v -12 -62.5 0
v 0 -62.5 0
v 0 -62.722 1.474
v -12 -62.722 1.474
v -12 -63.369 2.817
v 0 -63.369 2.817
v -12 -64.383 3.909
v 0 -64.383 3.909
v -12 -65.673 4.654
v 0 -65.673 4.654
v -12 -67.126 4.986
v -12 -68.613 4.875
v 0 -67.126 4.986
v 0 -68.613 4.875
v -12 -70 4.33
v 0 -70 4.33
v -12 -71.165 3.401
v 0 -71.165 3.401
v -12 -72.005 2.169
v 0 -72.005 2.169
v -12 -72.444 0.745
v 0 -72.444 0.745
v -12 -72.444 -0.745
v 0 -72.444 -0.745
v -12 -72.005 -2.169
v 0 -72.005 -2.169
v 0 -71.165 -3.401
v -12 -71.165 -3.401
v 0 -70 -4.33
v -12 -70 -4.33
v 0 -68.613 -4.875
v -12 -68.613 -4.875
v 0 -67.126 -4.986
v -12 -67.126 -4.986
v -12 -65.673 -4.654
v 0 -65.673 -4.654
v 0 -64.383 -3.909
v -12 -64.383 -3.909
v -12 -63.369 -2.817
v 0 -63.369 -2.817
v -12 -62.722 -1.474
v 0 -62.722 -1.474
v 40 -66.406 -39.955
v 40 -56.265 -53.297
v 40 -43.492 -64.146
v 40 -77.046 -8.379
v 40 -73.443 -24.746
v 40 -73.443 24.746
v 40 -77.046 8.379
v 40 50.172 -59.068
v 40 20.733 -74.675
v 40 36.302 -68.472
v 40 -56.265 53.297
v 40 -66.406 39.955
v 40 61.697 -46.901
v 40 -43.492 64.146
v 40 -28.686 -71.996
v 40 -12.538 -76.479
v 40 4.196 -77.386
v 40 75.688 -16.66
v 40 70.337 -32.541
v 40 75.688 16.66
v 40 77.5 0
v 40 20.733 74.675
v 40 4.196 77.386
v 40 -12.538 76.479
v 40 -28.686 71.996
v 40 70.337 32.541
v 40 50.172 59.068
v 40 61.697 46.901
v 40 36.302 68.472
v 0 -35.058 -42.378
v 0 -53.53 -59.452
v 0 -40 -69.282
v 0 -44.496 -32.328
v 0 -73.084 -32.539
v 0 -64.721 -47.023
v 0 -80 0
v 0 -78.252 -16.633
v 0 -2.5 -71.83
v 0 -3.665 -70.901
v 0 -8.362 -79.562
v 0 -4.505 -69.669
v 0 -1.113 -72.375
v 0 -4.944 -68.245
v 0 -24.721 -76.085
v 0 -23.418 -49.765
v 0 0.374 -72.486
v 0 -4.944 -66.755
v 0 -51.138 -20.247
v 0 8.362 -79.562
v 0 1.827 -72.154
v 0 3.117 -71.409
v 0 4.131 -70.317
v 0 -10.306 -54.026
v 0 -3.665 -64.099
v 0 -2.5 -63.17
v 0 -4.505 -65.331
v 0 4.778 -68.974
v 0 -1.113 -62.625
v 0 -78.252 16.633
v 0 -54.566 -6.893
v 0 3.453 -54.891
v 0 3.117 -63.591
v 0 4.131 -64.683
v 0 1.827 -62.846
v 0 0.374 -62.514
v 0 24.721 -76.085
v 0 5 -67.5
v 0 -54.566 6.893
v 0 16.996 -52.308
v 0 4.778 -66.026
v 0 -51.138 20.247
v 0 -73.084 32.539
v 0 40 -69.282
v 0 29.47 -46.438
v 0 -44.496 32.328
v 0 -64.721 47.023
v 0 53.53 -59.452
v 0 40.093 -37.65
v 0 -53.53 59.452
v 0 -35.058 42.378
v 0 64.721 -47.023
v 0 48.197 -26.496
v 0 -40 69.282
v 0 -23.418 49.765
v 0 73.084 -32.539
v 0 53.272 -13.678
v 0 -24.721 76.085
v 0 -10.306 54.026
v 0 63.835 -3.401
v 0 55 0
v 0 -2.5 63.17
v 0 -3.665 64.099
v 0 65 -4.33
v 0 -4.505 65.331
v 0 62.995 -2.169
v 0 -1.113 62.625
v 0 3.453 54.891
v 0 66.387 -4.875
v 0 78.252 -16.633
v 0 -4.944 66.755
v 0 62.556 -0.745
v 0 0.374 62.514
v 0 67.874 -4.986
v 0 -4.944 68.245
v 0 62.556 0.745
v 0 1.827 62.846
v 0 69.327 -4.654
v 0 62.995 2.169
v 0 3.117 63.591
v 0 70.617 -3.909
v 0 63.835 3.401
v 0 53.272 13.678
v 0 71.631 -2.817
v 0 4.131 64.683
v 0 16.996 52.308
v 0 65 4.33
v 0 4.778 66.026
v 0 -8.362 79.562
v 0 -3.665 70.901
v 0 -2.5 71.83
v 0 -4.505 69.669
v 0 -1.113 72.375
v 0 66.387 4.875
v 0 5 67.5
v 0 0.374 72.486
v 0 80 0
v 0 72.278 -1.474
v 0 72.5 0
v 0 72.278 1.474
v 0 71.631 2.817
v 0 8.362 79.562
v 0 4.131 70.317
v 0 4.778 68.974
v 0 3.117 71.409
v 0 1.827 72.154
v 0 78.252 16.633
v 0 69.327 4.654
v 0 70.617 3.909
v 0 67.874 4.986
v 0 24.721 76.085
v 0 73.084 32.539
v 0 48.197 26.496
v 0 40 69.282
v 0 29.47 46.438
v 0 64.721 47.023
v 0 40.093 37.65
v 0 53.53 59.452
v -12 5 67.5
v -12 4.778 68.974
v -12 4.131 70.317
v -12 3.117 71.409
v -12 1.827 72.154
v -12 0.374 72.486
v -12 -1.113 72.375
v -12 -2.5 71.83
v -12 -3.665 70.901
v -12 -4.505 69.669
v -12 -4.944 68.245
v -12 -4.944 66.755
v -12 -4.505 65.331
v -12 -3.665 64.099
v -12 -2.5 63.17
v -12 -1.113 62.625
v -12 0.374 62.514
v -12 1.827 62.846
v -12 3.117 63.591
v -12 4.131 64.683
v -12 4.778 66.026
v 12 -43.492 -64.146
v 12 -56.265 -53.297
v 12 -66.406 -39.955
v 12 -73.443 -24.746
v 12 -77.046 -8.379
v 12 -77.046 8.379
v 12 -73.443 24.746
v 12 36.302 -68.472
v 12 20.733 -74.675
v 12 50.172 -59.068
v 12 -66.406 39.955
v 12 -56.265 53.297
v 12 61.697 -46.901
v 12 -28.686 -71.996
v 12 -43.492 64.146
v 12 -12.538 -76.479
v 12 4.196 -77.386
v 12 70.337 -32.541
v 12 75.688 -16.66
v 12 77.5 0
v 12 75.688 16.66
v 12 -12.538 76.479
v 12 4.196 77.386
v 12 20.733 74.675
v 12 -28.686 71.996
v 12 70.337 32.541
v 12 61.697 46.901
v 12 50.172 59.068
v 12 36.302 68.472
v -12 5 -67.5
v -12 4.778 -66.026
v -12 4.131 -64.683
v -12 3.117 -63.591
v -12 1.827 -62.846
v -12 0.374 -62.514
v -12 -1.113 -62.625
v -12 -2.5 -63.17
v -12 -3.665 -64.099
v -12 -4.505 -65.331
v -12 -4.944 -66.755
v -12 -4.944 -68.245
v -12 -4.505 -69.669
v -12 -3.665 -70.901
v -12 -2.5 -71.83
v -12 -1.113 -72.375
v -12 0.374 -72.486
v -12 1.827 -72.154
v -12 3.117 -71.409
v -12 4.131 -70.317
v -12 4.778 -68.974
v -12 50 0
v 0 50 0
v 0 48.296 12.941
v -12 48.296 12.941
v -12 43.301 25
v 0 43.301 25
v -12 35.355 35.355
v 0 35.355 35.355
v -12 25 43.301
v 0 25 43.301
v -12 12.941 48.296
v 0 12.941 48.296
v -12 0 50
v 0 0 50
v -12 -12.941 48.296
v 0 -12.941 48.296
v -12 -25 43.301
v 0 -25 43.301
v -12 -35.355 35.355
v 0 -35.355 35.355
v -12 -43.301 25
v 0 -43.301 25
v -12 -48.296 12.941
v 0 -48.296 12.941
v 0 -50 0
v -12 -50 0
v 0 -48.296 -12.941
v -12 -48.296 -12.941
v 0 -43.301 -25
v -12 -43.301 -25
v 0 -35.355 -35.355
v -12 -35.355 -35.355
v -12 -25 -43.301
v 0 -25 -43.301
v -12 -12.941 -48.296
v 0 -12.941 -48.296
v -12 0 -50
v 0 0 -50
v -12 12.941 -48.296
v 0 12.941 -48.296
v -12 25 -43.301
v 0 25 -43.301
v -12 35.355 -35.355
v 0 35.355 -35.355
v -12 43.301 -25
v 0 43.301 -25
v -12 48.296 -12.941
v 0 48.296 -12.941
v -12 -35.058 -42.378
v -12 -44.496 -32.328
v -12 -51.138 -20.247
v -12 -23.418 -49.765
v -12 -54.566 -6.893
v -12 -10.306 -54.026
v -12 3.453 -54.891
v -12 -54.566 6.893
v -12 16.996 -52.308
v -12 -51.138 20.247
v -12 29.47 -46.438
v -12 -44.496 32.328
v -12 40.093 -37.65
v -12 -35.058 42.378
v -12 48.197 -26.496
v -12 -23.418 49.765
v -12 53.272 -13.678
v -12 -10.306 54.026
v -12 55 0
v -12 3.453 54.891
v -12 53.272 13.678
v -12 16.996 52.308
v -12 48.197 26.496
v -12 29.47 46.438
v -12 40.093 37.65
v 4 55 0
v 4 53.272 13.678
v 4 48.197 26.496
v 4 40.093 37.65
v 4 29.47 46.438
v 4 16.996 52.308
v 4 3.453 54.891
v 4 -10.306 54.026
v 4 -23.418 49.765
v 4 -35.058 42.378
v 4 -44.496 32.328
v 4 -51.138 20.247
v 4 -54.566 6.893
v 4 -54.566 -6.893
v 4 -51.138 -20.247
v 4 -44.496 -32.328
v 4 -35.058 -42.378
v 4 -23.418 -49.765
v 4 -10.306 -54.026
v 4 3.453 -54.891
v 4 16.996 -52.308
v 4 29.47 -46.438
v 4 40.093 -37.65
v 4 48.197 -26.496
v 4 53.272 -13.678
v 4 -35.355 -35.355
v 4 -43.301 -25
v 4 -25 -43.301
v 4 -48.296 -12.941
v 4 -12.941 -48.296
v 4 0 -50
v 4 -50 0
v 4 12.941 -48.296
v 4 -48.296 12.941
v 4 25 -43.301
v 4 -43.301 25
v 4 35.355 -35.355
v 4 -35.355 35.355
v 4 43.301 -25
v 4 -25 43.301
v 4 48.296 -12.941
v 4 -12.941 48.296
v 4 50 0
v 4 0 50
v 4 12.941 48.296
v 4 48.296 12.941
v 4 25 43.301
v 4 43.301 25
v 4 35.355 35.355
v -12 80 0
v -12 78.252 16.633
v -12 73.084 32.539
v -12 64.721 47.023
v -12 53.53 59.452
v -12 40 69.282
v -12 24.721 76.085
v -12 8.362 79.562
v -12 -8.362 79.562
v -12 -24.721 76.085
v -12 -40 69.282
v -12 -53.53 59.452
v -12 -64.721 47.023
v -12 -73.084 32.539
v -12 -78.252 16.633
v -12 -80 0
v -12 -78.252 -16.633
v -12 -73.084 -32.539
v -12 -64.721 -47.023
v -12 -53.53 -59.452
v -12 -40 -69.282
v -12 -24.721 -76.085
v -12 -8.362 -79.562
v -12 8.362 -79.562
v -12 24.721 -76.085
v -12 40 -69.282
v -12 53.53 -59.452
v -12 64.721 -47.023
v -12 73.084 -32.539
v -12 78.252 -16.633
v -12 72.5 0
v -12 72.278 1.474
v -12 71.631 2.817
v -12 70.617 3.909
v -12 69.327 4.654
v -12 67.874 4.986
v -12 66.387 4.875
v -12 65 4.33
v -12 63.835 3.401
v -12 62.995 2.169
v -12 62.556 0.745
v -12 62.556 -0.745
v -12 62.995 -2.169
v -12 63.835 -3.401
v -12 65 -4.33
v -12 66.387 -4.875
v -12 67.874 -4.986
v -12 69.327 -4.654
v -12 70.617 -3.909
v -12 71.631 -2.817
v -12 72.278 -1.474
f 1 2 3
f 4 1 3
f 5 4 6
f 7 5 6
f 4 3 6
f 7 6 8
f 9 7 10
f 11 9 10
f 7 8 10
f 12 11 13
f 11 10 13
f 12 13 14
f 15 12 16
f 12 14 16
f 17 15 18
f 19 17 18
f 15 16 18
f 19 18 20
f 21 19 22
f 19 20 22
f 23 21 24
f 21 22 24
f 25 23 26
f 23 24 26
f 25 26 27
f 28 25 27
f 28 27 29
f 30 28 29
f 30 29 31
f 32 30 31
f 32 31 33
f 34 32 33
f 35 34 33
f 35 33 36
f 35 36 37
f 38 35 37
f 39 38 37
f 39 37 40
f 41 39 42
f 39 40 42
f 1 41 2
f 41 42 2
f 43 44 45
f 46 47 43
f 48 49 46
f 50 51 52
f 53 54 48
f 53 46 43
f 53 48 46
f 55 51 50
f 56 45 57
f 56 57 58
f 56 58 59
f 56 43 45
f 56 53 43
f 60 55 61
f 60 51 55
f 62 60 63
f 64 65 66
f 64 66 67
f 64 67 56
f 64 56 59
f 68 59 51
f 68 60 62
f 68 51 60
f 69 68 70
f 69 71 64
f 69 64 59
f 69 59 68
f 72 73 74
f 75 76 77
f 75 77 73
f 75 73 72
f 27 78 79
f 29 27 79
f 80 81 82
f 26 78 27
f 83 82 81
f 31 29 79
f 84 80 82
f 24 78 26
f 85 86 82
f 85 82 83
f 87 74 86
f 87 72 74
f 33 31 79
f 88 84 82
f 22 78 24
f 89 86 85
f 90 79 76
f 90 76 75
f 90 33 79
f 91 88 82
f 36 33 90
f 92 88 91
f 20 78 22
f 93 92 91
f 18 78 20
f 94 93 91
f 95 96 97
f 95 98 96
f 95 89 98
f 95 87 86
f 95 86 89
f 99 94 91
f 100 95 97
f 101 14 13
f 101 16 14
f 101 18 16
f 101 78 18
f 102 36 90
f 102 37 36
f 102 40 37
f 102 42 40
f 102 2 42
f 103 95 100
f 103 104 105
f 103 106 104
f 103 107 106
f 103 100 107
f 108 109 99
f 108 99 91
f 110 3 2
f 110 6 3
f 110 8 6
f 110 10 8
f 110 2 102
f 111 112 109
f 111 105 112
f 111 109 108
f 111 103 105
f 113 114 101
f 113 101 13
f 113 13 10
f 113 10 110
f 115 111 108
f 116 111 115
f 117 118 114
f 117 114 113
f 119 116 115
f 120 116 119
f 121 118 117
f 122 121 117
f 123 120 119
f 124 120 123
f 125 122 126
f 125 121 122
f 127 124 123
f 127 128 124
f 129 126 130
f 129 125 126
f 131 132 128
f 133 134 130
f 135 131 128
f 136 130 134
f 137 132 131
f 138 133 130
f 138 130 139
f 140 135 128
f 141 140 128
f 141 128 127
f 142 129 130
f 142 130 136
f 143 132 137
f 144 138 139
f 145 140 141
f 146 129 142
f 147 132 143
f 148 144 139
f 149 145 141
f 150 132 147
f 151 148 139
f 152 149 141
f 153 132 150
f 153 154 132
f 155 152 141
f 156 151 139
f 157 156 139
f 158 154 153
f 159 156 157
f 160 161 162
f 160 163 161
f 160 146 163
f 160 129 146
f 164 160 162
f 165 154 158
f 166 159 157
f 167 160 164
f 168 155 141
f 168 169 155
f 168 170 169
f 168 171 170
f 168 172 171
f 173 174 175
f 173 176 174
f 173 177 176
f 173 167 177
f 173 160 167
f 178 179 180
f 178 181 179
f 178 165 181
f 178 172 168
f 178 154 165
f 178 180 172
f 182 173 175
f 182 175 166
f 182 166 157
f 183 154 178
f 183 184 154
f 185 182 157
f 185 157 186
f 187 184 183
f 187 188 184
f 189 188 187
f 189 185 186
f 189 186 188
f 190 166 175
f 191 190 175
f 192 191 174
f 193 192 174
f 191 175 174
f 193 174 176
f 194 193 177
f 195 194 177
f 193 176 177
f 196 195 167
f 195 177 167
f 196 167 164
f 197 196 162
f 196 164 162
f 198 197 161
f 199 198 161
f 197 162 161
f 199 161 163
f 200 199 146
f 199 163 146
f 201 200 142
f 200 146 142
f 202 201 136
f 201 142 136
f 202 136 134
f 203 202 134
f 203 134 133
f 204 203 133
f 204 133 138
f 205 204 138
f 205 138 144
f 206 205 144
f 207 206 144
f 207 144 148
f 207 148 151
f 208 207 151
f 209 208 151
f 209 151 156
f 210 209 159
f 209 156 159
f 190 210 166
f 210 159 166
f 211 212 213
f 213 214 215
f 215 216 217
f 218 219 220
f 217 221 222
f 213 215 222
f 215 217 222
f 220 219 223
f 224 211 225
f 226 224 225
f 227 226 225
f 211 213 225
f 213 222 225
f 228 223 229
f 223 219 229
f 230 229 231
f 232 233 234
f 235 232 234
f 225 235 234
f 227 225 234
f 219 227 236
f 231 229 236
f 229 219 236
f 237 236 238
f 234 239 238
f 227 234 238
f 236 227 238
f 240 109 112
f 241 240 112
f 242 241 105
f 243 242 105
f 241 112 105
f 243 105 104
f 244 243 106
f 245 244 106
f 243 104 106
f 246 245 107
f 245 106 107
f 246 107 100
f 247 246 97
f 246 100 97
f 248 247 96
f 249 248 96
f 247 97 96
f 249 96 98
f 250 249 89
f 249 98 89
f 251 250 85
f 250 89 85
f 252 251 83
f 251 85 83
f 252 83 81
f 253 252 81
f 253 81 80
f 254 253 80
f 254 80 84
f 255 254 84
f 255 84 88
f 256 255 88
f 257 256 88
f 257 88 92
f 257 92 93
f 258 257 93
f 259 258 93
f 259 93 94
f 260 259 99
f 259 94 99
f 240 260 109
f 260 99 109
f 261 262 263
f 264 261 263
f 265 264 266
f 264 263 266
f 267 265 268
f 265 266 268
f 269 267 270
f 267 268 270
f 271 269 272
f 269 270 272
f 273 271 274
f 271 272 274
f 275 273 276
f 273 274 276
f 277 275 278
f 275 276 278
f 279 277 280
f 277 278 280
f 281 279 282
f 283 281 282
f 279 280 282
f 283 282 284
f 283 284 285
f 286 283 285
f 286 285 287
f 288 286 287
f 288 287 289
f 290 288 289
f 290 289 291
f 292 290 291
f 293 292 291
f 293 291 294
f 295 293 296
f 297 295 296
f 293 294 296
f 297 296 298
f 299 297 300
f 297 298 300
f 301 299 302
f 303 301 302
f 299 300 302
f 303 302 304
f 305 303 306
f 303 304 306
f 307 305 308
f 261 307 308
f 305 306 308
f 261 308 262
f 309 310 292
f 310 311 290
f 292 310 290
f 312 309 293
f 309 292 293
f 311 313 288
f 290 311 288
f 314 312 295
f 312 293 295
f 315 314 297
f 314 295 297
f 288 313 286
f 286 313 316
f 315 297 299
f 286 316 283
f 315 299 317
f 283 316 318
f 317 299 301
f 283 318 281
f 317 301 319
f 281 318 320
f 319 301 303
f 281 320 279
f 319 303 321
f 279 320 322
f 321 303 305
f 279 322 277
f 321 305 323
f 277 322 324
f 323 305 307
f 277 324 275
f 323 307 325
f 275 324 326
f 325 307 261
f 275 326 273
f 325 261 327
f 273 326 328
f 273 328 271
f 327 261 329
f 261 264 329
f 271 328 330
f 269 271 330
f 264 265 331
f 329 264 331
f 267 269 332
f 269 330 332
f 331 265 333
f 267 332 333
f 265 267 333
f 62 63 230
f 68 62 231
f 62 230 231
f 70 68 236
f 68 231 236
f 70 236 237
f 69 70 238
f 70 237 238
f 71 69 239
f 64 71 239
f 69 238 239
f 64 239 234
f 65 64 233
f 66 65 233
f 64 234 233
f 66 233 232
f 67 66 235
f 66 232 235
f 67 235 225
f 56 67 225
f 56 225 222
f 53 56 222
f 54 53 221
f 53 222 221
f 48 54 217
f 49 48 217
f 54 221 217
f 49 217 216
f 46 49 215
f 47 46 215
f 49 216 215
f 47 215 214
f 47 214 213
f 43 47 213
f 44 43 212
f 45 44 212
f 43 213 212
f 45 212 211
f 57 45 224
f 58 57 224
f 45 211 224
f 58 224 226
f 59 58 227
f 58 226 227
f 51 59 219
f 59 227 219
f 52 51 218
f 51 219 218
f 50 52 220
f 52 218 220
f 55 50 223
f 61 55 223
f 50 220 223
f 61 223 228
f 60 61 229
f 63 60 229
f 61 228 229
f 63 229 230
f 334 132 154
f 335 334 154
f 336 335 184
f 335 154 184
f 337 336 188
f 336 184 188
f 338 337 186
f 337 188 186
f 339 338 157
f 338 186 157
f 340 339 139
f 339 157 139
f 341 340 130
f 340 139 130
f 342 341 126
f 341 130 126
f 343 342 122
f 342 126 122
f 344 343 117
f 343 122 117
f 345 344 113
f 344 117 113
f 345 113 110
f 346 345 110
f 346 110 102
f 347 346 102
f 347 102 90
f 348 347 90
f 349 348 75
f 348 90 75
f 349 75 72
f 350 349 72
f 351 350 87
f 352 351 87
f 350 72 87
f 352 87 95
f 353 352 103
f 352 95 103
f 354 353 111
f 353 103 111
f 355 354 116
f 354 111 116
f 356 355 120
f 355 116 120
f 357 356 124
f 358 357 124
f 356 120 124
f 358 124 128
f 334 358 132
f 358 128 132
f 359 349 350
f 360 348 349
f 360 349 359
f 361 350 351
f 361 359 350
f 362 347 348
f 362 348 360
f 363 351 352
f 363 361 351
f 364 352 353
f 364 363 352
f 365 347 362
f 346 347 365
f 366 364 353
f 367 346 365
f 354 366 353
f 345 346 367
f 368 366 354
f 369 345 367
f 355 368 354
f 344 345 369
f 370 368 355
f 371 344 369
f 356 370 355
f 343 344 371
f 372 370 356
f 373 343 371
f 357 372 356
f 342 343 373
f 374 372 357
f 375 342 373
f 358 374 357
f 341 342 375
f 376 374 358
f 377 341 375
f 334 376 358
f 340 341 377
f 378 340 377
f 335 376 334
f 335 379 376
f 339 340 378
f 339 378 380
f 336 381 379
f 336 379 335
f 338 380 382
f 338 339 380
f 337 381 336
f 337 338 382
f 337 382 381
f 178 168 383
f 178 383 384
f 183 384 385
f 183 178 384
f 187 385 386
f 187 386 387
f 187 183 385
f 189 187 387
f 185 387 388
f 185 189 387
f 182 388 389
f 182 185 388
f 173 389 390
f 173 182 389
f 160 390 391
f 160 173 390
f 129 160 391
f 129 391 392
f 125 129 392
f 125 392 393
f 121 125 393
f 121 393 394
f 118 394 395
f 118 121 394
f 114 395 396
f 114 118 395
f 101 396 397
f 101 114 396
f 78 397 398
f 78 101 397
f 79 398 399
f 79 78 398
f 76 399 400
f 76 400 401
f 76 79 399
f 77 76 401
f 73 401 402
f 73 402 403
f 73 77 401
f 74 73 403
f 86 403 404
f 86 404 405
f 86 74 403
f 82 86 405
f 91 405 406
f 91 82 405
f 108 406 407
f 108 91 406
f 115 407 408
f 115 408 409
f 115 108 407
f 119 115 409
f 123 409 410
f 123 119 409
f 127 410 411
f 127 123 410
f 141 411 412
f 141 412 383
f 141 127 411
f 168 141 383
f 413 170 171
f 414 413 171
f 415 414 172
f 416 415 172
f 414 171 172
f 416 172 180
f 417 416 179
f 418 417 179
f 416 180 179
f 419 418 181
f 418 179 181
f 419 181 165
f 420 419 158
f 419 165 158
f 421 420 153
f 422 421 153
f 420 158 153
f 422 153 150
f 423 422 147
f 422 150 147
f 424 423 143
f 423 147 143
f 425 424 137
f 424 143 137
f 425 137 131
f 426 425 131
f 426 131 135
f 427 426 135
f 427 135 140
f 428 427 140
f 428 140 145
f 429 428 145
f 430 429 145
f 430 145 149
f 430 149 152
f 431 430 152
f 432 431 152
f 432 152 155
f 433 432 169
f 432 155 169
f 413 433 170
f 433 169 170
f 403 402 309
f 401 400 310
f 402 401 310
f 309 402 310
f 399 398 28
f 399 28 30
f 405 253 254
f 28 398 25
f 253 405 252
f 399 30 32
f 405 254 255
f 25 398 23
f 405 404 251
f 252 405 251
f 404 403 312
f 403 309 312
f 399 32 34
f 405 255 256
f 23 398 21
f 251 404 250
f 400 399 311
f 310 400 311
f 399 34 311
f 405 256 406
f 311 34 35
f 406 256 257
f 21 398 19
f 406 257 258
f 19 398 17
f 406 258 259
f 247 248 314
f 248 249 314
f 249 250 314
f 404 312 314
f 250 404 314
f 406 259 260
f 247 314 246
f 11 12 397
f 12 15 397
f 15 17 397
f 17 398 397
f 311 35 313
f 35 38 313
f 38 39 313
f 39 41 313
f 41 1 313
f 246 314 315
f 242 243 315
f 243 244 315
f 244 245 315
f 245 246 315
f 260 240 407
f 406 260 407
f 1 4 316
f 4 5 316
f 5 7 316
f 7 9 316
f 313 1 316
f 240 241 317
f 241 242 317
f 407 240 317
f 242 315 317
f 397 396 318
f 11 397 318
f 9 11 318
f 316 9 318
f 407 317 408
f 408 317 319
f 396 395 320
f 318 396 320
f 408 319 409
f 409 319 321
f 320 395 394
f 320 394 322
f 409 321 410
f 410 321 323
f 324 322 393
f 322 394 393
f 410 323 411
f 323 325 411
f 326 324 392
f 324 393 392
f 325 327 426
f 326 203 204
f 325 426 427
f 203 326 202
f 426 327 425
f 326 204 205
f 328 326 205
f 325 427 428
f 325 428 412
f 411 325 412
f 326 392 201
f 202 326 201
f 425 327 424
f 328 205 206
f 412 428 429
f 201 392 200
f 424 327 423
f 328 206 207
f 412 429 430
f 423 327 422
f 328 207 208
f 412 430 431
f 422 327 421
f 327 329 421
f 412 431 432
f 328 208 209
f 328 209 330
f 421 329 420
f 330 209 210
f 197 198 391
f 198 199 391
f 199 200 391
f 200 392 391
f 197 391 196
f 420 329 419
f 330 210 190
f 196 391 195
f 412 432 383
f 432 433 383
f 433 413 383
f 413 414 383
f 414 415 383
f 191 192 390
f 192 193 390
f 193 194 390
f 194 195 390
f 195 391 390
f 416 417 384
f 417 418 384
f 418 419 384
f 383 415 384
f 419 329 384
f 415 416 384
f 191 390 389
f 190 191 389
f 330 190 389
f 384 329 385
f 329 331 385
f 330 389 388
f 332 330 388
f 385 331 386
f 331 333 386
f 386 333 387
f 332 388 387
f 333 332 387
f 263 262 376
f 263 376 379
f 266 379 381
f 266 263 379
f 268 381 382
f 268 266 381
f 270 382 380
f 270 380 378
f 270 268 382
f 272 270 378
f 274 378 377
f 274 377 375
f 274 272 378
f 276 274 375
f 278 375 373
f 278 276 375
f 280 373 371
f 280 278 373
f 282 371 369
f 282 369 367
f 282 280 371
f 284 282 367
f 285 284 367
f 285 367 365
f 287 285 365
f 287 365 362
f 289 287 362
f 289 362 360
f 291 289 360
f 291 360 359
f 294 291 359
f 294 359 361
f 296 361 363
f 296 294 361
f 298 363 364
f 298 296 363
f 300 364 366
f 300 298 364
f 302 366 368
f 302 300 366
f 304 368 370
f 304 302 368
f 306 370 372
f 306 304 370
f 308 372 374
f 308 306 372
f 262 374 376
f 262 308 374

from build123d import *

# Parameters (mm, degrees)
F0_R          = 80
F0_R_2        = 5
F0_R_3        = 55
F1_DEPTH      = 12
F0_R_4        = 50
F2_DEPTH      = 4
F2_DEPTH_BACK = 12
F4_START      = 12
F3_R          = 77.5
F4_DEPTH      = 28


with BuildPart() as f1:
    # F0 (on Right) → F1 (new body)
    with BuildSketch(Plane.YZ):
        Circle(F0_R)
        with Locations((0, -67.5)):
            Circle(F0_R_2, mode=Mode.SUBTRACT)
        with Locations((-67.5, 0)):
            Circle(F0_R_2, mode=Mode.SUBTRACT)
        Circle(F0_R_3, mode=Mode.SUBTRACT)
        with Locations((67.5, 0)):
            Circle(F0_R_2, mode=Mode.SUBTRACT)
        with Locations((0, 67.5)):
            Circle(F0_R_2, mode=Mode.SUBTRACT)
    extrude(amount=-F1_DEPTH)

    # F0 (on Right) → F2 (join, two sides)
    with BuildSketch(Plane.YZ) as f2_sk:
        Circle(F0_R_3)
        Circle(F0_R_4, mode=Mode.SUBTRACT)
    extrude(amount=F2_DEPTH)
    extrude(f2_sk.sketch, amount=-F2_DEPTH_BACK)


with BuildPart() as f4:
    # F3 (on Right) → F4 (new body)
    with BuildSketch(Plane.YZ.offset(F4_START)):
        Circle(F3_R)
    extrude(amount=F4_DEPTH)


solid = Compound([f1.part, f4.part])
